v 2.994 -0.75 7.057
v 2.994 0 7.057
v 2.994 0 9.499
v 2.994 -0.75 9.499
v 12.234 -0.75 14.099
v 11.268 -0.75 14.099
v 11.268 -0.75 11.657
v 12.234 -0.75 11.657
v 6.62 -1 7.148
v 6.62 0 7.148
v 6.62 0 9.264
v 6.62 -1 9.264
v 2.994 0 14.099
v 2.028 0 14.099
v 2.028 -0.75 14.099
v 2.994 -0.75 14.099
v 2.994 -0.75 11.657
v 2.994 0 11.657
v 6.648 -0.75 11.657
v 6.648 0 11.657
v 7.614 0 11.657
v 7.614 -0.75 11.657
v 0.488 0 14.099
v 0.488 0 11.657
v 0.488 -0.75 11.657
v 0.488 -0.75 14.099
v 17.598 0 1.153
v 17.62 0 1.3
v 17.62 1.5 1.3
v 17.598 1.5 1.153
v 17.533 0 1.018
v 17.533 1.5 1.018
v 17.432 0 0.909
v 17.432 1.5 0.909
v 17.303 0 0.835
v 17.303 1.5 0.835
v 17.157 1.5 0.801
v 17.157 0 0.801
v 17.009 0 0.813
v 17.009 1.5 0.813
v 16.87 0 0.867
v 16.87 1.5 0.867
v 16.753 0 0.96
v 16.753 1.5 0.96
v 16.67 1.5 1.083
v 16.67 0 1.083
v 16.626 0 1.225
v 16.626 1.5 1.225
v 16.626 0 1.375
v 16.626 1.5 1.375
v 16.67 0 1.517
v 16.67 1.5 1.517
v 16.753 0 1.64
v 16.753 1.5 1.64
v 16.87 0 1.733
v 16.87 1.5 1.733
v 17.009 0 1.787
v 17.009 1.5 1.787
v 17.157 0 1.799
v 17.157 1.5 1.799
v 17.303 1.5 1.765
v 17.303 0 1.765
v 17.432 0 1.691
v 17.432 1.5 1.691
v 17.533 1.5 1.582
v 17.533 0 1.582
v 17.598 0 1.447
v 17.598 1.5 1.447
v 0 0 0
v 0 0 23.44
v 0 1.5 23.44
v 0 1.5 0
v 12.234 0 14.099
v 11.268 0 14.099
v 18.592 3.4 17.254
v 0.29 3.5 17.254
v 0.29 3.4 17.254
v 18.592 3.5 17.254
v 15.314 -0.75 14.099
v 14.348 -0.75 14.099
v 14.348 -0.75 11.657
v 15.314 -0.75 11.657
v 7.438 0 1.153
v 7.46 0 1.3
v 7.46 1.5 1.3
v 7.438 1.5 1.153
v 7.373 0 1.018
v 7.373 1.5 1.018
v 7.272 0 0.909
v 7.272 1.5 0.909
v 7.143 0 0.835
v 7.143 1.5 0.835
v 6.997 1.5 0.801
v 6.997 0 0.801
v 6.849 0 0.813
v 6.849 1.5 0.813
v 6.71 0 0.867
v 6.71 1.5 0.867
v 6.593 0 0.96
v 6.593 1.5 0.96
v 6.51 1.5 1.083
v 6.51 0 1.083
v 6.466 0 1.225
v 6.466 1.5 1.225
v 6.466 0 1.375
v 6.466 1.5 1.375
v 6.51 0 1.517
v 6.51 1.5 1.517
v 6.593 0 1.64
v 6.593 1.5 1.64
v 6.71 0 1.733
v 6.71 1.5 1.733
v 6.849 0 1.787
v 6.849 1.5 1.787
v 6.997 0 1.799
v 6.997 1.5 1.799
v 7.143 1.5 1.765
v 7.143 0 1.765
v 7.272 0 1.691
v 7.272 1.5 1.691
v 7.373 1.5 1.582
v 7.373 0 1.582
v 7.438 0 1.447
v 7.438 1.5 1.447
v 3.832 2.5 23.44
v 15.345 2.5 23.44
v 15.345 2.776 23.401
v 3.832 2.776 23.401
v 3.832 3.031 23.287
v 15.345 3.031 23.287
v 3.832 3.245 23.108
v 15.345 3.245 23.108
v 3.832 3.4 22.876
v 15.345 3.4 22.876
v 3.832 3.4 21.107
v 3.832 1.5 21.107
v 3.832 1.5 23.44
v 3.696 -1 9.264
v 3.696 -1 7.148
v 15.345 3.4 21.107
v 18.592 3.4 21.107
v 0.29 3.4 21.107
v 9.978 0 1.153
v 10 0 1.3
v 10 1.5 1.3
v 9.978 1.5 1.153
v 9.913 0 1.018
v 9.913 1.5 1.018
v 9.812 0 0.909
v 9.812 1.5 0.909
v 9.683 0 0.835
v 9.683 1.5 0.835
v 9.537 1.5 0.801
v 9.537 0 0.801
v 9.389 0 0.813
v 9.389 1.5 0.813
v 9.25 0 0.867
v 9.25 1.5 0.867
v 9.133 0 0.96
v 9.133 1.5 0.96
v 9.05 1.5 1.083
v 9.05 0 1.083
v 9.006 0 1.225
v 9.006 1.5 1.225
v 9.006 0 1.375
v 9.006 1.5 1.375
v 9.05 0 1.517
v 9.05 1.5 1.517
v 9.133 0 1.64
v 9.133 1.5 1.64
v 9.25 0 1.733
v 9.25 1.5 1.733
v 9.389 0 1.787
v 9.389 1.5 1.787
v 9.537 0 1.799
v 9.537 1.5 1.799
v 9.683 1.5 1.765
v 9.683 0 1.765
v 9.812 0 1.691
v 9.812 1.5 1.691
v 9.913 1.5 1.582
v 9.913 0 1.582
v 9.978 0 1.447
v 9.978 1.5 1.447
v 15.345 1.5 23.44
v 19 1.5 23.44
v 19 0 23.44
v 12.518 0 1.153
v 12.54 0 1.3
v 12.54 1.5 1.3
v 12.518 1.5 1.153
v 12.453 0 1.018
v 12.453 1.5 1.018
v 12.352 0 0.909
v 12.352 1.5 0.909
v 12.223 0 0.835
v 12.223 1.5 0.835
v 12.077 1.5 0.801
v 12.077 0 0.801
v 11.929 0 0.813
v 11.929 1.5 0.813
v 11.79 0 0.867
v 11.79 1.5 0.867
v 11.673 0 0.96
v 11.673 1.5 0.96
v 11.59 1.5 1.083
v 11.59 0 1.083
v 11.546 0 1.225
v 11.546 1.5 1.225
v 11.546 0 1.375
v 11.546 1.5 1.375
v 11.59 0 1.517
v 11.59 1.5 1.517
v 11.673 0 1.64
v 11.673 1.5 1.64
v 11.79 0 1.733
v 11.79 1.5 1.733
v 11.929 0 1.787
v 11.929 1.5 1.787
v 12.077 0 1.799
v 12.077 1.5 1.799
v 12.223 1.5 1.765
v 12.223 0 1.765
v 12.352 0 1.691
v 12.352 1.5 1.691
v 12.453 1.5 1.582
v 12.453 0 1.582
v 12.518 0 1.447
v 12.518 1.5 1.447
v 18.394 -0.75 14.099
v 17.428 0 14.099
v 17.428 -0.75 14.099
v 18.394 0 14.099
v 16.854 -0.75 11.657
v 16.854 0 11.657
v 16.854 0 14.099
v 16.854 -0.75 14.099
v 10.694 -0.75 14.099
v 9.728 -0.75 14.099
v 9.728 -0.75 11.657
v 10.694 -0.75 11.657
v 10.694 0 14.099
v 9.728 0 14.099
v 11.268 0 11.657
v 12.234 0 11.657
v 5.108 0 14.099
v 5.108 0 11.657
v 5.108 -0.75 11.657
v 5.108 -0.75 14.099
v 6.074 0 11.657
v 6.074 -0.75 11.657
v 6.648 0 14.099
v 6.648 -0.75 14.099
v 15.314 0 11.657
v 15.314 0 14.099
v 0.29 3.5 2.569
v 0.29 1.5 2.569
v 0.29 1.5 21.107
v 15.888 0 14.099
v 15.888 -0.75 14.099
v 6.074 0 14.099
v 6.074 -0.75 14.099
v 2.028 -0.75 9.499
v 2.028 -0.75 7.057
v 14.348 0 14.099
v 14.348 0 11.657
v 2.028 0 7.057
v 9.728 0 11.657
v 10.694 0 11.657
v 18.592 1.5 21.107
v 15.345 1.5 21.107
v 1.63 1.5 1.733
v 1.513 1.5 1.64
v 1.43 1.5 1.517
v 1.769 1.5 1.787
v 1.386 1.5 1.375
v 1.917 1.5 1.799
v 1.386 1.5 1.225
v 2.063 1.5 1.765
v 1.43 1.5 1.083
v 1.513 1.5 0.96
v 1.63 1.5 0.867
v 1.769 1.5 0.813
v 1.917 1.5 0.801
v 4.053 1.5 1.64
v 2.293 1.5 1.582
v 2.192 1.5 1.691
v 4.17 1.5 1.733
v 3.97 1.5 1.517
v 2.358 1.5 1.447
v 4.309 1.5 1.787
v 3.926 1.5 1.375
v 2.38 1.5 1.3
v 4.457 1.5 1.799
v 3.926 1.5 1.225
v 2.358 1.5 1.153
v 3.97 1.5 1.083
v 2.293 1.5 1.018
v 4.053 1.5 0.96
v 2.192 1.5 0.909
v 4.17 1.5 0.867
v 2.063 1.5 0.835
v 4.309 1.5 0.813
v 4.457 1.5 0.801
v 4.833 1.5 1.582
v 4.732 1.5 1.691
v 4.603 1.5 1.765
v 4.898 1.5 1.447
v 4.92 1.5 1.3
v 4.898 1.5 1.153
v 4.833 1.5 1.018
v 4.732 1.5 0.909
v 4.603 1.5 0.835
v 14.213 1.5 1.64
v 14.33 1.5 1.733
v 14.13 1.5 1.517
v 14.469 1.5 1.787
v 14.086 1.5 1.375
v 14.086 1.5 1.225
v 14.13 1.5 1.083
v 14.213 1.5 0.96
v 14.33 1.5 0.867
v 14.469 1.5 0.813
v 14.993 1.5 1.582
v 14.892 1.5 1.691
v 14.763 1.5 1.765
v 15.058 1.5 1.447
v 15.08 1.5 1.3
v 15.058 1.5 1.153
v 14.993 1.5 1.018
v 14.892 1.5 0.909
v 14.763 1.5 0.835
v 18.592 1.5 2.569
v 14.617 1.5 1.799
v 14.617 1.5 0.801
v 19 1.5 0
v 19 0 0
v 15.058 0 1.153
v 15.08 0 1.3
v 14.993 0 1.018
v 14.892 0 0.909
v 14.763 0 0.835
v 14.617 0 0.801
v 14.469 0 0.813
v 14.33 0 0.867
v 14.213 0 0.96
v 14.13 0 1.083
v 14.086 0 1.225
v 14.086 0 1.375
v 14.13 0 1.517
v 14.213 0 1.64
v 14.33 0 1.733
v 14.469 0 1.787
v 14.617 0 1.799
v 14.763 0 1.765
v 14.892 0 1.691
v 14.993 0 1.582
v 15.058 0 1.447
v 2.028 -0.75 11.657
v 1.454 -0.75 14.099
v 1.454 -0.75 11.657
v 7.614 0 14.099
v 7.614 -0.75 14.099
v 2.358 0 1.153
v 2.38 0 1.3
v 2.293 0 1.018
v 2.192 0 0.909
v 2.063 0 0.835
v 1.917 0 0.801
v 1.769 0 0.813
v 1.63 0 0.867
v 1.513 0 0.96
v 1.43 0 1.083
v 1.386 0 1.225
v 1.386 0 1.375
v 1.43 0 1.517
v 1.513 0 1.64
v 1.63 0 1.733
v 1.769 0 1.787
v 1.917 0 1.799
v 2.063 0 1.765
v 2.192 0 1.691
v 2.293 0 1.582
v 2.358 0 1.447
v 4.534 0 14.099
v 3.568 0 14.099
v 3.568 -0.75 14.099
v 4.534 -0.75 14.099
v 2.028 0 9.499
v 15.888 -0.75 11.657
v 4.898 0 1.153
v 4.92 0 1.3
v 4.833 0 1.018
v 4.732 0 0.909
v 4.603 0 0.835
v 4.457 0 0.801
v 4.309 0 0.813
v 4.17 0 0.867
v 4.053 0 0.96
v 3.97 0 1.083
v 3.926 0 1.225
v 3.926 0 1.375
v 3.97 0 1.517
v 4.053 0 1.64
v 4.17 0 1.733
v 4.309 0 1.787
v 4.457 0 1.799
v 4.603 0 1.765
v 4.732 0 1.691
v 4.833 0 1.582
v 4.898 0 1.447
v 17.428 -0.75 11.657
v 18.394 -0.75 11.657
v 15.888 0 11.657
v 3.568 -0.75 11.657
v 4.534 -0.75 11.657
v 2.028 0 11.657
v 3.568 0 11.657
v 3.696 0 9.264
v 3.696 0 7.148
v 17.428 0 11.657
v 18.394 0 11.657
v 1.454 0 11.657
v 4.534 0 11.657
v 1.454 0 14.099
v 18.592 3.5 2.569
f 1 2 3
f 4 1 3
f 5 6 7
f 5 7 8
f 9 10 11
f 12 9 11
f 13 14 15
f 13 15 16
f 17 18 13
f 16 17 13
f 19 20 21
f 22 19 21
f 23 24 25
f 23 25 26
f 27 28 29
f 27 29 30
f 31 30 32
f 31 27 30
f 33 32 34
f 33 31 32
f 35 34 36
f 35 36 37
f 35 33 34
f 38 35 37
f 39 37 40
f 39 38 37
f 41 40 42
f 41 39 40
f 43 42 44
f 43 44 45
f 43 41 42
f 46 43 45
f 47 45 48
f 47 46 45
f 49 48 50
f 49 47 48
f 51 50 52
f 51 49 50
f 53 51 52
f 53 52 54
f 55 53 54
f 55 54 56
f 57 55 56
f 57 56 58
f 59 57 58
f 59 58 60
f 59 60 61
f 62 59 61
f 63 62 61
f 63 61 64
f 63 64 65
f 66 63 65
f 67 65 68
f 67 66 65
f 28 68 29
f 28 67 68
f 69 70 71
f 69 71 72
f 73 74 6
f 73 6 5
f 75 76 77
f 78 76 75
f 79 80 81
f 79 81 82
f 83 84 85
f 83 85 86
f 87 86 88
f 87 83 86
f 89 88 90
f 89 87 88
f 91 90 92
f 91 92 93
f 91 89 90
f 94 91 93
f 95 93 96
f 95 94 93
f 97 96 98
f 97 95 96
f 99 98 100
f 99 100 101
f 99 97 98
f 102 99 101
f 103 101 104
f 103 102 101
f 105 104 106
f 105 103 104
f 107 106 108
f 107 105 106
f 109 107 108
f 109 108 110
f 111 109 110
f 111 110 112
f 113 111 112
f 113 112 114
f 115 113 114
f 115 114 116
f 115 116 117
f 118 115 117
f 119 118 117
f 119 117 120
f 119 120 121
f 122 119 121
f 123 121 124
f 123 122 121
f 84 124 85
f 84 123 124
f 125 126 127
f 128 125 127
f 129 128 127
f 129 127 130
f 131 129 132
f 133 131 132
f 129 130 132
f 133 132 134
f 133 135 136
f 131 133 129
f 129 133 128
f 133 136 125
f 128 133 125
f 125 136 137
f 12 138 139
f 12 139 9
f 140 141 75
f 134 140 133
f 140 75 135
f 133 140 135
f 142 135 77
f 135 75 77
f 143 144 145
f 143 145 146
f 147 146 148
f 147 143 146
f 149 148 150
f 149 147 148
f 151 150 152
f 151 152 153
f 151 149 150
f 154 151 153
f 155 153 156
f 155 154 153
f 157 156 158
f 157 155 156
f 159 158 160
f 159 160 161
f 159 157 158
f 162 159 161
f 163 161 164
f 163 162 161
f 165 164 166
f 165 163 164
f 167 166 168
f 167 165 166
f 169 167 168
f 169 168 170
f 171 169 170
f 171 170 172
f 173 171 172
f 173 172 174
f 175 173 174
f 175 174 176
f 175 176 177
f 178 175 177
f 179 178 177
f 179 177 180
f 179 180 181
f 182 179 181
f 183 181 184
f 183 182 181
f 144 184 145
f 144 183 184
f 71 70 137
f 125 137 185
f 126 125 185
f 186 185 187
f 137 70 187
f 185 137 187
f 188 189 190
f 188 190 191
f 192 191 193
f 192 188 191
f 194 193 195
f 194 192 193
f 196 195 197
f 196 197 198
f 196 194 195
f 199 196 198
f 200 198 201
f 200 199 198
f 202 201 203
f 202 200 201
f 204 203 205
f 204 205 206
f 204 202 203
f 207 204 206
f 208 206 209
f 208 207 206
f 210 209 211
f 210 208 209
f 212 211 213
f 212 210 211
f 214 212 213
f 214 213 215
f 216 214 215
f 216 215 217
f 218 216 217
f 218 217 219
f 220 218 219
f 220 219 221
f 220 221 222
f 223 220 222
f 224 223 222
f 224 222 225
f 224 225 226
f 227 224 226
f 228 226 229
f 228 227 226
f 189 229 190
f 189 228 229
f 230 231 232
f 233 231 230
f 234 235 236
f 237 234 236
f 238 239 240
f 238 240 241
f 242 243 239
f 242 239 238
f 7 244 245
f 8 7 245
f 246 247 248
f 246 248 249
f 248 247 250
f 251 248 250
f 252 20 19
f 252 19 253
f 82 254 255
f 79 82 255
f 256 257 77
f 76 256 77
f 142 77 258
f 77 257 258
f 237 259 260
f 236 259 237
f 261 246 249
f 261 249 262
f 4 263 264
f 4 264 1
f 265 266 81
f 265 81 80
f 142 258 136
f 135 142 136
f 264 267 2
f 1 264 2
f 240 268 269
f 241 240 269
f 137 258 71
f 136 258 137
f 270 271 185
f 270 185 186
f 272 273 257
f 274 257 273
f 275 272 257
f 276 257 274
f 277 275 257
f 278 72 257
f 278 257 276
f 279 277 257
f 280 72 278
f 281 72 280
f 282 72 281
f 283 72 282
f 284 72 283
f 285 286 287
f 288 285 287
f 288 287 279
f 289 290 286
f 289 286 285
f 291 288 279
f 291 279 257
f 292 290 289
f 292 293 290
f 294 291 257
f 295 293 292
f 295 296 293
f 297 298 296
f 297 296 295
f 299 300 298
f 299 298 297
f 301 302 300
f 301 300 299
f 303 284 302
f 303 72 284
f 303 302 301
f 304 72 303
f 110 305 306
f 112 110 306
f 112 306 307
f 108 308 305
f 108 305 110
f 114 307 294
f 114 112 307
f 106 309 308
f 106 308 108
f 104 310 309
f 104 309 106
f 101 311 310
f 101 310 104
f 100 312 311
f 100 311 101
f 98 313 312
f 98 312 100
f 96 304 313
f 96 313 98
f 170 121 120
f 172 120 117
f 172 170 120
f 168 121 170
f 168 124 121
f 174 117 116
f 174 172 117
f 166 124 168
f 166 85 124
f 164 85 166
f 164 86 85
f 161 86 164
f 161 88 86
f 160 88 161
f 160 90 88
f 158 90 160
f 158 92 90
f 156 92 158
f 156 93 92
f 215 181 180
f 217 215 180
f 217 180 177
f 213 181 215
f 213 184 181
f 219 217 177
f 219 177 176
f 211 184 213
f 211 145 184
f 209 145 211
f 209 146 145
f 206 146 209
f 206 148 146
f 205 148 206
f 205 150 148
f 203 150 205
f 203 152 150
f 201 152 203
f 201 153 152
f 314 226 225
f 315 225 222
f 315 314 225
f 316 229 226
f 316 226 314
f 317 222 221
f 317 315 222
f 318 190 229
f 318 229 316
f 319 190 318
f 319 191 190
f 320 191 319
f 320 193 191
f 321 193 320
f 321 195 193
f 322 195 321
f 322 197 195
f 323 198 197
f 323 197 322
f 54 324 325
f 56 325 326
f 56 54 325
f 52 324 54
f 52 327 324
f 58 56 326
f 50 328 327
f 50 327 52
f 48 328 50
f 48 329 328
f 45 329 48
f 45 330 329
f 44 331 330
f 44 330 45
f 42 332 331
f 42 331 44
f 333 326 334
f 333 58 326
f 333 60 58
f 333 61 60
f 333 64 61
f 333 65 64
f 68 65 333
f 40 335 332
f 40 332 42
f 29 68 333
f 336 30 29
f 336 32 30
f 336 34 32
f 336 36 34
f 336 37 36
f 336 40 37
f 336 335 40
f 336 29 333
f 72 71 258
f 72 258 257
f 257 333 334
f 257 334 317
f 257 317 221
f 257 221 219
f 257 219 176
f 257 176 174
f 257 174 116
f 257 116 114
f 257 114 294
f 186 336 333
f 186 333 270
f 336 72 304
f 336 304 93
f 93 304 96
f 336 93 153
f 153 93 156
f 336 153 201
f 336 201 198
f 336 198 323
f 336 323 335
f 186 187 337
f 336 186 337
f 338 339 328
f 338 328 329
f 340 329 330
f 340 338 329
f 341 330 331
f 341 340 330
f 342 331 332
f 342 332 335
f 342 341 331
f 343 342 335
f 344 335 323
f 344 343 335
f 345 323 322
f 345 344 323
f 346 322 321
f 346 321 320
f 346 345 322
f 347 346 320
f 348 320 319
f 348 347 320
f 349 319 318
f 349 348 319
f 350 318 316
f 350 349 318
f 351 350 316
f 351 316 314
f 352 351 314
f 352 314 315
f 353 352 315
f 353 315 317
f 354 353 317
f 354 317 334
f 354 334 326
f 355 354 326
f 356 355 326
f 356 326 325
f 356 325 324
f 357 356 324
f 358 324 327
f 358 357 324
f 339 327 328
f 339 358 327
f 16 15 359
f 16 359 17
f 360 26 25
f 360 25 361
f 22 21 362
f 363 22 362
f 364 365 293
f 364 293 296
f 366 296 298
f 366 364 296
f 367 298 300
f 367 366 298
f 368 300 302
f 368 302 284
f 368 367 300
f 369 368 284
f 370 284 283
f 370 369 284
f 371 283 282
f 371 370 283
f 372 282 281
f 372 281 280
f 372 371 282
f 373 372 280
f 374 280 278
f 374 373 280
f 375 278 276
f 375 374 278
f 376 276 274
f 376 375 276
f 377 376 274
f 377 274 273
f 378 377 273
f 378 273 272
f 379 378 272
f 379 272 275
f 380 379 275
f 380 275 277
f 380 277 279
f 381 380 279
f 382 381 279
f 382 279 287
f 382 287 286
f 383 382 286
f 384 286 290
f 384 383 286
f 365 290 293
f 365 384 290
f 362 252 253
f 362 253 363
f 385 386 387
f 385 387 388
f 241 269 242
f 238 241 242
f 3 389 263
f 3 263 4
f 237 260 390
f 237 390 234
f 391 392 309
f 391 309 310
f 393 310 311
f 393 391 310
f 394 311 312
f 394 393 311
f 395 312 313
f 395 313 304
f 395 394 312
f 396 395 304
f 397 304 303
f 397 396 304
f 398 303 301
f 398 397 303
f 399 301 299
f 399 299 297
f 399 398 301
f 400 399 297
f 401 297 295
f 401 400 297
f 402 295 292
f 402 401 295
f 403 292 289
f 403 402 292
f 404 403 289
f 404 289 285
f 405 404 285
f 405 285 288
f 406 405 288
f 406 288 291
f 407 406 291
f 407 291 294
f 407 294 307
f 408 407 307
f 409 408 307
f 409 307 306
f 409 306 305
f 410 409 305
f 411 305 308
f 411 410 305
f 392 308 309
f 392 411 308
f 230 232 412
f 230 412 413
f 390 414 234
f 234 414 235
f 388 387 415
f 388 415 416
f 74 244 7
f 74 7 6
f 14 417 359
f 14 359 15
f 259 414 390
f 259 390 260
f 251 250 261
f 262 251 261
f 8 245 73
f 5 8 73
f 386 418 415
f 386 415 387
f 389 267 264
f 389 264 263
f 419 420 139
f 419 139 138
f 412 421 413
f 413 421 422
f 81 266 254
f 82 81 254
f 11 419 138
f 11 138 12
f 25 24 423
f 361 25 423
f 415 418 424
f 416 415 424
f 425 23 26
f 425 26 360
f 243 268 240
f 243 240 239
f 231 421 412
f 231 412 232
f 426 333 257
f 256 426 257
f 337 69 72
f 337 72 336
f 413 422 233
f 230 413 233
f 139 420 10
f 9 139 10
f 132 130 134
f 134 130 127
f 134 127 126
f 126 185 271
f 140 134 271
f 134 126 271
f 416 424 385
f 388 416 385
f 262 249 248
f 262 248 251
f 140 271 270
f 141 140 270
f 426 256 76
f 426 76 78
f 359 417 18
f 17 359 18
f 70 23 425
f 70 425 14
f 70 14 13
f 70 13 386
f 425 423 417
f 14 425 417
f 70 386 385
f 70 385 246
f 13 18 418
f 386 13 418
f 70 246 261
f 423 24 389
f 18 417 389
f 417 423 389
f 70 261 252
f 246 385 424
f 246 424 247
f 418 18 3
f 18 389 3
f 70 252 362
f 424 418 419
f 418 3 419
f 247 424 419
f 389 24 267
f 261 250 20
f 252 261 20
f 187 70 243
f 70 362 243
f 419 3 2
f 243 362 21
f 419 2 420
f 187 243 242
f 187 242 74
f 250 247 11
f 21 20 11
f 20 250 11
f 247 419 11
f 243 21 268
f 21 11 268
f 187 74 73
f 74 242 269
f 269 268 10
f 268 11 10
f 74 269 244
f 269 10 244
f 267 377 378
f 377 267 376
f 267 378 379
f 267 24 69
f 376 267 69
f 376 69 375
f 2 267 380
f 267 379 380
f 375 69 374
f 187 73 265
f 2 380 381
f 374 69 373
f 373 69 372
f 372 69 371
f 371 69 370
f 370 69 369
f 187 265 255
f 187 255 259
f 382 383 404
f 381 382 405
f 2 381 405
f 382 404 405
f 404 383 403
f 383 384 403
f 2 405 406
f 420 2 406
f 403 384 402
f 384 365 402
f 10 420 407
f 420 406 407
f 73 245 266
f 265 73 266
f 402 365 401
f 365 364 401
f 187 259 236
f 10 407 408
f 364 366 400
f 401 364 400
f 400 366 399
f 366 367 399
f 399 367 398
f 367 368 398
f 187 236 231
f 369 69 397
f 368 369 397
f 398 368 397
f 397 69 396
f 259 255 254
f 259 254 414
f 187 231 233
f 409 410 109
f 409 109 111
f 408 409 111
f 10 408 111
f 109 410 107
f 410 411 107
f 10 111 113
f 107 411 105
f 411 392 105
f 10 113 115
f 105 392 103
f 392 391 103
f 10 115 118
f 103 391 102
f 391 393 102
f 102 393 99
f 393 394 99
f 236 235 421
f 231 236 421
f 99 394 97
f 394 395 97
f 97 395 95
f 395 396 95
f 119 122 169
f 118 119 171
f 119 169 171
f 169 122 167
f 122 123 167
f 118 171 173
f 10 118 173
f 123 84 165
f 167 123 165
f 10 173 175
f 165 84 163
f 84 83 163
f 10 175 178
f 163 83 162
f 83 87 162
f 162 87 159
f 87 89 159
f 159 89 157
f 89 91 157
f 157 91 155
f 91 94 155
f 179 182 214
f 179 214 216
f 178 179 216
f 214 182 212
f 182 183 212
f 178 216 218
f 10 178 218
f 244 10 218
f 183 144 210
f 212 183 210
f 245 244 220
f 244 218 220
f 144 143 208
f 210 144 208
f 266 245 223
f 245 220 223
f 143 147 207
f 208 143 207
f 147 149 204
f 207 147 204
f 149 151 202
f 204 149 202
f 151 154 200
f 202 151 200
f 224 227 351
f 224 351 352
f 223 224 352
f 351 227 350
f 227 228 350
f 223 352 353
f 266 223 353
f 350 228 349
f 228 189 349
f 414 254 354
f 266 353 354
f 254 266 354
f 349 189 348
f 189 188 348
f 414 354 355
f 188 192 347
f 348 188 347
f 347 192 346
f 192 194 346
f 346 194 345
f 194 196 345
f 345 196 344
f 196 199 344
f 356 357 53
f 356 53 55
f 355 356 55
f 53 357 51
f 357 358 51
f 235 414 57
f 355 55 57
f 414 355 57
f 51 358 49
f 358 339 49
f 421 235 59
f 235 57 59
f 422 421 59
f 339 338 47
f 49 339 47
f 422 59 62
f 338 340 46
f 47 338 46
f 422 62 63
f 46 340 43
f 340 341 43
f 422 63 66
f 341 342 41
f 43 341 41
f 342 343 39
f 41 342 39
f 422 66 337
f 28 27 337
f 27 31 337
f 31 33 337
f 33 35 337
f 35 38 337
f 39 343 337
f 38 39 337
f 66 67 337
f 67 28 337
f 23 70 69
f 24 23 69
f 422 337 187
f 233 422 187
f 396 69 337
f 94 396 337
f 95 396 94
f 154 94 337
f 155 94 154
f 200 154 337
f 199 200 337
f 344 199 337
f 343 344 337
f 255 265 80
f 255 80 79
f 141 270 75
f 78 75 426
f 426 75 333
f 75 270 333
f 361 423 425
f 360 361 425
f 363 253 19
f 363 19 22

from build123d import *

# Parameters (mm, degrees)
SKETCH1_W           = 19
SKETCH1_H           = 23.44
SKETCH1_R           = 0.5
BOSS_EXTRUDE1_DEPTH = 1.5
BOSS_EXTRUDE2_DEPTH = 2
FILLET1_R           = 1
SKETCH4_W           = 2.923966861
SKETCH4_H           = 2.115382352
BOSS_EXTRUDE3_DEPTH = 1
SKETCH5_W           = 0.965682683
SKETCH5_H           = 2.442516719
BOSS_EXTRUDE4_DEPTH = 0.75
CUT_EXTRUDE1_DEPTH  = 0.1


with BuildPart() as part:
    # Sketch1 → Boss-Extrude1 (new body)
    with BuildSketch(Plane(origin=(0, 0, 0), x_dir=(1, 0, 0), z_dir=(0, 1, 0))):
        with Locations((9.5, -11.72)):
            Rectangle(SKETCH1_W, SKETCH1_H)
        with Locations((1.88, -1.3)):
            Circle(SKETCH1_R, mode=Mode.SUBTRACT)
        with Locations((4.42, -1.3)):
            Circle(SKETCH1_R, mode=Mode.SUBTRACT)
        with Locations((6.96, -1.3)):
            Circle(SKETCH1_R, mode=Mode.SUBTRACT)
        with Locations((9.5, -1.3)):
            Circle(SKETCH1_R, mode=Mode.SUBTRACT)
        with Locations((12.04, -1.3)):
            Circle(SKETCH1_R, mode=Mode.SUBTRACT)
        with Locations((14.58, -1.3)):
            Circle(SKETCH1_R, mode=Mode.SUBTRACT)
        with Locations((17.12, -1.3)):
            Circle(SKETCH1_R, mode=Mode.SUBTRACT)
    extrude(amount=BOSS_EXTRUDE1_DEPTH)

    # Sketch3 → Boss-Extrude2 (add)
    with BuildSketch(Plane(origin=(0, 1.5, 0), x_dir=(1, 0, 0), z_dir=(0, 1, 0))):
        Polygon((3.832385917, -21.106985825), (3.832385917, -23.44), (15.344727023, -23.44), (15.344727023, -21.106985825), (18.591797592, -21.106985825), (18.591797592, -2.569164761), (0.290127115, -2.569164761), (0.290127115, -21.106985825), align=None)
    extrude(amount=BOSS_EXTRUDE2_DEPTH)

    # Fillet1
    fillet1_edges = [part.edges().sort_by_distance(p)[0] for p in [
        (9.58855647, 3.5, 23.44),
    ]]
    fillet(fillet1_edges, radius=FILLET1_R)

    # Sketch4 → Boss-Extrude3 (add)
    with BuildSketch(Plane.XZ):
        with Locations((5.157821851, 8.205990998)):
            Rectangle(SKETCH4_W, SKETCH4_H)
    extrude(amount=BOSS_EXTRUDE3_DEPTH)

    # Sketch5 → Boss-Extrude4 (add)
    with BuildSketch(Plane.XZ):
        with Locations((2.511251492, 12.877880521)):
            Rectangle(SKETCH5_W, SKETCH5_H)
        with Locations((0.971251492, 12.877880521)):
            Rectangle(SKETCH5_W, SKETCH5_H)
        with Locations((4.051251492, 12.877880521)):
            Rectangle(SKETCH5_W, SKETCH5_H)
        with Locations((5.591251492, 12.877880521)):
            Rectangle(SKETCH5_W, SKETCH5_H)
        with Locations((7.131251492, 12.877880521)):
            Rectangle(SKETCH5_W, SKETCH5_H)
        with Locations((10.211251492, 12.877880521)):
            Rectangle(SKETCH5_W, SKETCH5_H)
        with Locations((11.751251491, 12.877880521)):
            Rectangle(SKETCH5_W, SKETCH5_H)
        with Locations((14.831251492, 12.877880521)):
            Rectangle(SKETCH5_W, SKETCH5_H)
        with Locations((16.371251492, 12.877880521)):
            Rectangle(SKETCH5_W, SKETCH5_H)
        with Locations((17.911251492, 12.877880521)):
            Rectangle(SKETCH5_W, SKETCH5_H)
        with Locations((2.511251492, 8.277880522)):
            Rectangle(SKETCH5_W, SKETCH5_H)
    extrude(amount=BOSS_EXTRUDE4_DEPTH)

    # Sketch6 → Cut-Extrude1 (cut)
    with BuildSketch(Plane(origin=(0, 3.5, 0), x_dir=(1, 0, 0), z_dir=(0, 1, 0))):
        Polygon((0.290127115, -17.253788657), (18.591797592, -17.253788657), (18.591797592, -21.106985825), (15.344727023, -21.106985825), (15.344727023, -23.44), (3.832385917, -23.44), (3.832385917, -21.106985825), (0.290127115, -21.106985825), align=None)
    extrude(amount=-CUT_EXTRUDE1_DEPTH, mode=Mode.SUBTRACT)


solid = part.part
